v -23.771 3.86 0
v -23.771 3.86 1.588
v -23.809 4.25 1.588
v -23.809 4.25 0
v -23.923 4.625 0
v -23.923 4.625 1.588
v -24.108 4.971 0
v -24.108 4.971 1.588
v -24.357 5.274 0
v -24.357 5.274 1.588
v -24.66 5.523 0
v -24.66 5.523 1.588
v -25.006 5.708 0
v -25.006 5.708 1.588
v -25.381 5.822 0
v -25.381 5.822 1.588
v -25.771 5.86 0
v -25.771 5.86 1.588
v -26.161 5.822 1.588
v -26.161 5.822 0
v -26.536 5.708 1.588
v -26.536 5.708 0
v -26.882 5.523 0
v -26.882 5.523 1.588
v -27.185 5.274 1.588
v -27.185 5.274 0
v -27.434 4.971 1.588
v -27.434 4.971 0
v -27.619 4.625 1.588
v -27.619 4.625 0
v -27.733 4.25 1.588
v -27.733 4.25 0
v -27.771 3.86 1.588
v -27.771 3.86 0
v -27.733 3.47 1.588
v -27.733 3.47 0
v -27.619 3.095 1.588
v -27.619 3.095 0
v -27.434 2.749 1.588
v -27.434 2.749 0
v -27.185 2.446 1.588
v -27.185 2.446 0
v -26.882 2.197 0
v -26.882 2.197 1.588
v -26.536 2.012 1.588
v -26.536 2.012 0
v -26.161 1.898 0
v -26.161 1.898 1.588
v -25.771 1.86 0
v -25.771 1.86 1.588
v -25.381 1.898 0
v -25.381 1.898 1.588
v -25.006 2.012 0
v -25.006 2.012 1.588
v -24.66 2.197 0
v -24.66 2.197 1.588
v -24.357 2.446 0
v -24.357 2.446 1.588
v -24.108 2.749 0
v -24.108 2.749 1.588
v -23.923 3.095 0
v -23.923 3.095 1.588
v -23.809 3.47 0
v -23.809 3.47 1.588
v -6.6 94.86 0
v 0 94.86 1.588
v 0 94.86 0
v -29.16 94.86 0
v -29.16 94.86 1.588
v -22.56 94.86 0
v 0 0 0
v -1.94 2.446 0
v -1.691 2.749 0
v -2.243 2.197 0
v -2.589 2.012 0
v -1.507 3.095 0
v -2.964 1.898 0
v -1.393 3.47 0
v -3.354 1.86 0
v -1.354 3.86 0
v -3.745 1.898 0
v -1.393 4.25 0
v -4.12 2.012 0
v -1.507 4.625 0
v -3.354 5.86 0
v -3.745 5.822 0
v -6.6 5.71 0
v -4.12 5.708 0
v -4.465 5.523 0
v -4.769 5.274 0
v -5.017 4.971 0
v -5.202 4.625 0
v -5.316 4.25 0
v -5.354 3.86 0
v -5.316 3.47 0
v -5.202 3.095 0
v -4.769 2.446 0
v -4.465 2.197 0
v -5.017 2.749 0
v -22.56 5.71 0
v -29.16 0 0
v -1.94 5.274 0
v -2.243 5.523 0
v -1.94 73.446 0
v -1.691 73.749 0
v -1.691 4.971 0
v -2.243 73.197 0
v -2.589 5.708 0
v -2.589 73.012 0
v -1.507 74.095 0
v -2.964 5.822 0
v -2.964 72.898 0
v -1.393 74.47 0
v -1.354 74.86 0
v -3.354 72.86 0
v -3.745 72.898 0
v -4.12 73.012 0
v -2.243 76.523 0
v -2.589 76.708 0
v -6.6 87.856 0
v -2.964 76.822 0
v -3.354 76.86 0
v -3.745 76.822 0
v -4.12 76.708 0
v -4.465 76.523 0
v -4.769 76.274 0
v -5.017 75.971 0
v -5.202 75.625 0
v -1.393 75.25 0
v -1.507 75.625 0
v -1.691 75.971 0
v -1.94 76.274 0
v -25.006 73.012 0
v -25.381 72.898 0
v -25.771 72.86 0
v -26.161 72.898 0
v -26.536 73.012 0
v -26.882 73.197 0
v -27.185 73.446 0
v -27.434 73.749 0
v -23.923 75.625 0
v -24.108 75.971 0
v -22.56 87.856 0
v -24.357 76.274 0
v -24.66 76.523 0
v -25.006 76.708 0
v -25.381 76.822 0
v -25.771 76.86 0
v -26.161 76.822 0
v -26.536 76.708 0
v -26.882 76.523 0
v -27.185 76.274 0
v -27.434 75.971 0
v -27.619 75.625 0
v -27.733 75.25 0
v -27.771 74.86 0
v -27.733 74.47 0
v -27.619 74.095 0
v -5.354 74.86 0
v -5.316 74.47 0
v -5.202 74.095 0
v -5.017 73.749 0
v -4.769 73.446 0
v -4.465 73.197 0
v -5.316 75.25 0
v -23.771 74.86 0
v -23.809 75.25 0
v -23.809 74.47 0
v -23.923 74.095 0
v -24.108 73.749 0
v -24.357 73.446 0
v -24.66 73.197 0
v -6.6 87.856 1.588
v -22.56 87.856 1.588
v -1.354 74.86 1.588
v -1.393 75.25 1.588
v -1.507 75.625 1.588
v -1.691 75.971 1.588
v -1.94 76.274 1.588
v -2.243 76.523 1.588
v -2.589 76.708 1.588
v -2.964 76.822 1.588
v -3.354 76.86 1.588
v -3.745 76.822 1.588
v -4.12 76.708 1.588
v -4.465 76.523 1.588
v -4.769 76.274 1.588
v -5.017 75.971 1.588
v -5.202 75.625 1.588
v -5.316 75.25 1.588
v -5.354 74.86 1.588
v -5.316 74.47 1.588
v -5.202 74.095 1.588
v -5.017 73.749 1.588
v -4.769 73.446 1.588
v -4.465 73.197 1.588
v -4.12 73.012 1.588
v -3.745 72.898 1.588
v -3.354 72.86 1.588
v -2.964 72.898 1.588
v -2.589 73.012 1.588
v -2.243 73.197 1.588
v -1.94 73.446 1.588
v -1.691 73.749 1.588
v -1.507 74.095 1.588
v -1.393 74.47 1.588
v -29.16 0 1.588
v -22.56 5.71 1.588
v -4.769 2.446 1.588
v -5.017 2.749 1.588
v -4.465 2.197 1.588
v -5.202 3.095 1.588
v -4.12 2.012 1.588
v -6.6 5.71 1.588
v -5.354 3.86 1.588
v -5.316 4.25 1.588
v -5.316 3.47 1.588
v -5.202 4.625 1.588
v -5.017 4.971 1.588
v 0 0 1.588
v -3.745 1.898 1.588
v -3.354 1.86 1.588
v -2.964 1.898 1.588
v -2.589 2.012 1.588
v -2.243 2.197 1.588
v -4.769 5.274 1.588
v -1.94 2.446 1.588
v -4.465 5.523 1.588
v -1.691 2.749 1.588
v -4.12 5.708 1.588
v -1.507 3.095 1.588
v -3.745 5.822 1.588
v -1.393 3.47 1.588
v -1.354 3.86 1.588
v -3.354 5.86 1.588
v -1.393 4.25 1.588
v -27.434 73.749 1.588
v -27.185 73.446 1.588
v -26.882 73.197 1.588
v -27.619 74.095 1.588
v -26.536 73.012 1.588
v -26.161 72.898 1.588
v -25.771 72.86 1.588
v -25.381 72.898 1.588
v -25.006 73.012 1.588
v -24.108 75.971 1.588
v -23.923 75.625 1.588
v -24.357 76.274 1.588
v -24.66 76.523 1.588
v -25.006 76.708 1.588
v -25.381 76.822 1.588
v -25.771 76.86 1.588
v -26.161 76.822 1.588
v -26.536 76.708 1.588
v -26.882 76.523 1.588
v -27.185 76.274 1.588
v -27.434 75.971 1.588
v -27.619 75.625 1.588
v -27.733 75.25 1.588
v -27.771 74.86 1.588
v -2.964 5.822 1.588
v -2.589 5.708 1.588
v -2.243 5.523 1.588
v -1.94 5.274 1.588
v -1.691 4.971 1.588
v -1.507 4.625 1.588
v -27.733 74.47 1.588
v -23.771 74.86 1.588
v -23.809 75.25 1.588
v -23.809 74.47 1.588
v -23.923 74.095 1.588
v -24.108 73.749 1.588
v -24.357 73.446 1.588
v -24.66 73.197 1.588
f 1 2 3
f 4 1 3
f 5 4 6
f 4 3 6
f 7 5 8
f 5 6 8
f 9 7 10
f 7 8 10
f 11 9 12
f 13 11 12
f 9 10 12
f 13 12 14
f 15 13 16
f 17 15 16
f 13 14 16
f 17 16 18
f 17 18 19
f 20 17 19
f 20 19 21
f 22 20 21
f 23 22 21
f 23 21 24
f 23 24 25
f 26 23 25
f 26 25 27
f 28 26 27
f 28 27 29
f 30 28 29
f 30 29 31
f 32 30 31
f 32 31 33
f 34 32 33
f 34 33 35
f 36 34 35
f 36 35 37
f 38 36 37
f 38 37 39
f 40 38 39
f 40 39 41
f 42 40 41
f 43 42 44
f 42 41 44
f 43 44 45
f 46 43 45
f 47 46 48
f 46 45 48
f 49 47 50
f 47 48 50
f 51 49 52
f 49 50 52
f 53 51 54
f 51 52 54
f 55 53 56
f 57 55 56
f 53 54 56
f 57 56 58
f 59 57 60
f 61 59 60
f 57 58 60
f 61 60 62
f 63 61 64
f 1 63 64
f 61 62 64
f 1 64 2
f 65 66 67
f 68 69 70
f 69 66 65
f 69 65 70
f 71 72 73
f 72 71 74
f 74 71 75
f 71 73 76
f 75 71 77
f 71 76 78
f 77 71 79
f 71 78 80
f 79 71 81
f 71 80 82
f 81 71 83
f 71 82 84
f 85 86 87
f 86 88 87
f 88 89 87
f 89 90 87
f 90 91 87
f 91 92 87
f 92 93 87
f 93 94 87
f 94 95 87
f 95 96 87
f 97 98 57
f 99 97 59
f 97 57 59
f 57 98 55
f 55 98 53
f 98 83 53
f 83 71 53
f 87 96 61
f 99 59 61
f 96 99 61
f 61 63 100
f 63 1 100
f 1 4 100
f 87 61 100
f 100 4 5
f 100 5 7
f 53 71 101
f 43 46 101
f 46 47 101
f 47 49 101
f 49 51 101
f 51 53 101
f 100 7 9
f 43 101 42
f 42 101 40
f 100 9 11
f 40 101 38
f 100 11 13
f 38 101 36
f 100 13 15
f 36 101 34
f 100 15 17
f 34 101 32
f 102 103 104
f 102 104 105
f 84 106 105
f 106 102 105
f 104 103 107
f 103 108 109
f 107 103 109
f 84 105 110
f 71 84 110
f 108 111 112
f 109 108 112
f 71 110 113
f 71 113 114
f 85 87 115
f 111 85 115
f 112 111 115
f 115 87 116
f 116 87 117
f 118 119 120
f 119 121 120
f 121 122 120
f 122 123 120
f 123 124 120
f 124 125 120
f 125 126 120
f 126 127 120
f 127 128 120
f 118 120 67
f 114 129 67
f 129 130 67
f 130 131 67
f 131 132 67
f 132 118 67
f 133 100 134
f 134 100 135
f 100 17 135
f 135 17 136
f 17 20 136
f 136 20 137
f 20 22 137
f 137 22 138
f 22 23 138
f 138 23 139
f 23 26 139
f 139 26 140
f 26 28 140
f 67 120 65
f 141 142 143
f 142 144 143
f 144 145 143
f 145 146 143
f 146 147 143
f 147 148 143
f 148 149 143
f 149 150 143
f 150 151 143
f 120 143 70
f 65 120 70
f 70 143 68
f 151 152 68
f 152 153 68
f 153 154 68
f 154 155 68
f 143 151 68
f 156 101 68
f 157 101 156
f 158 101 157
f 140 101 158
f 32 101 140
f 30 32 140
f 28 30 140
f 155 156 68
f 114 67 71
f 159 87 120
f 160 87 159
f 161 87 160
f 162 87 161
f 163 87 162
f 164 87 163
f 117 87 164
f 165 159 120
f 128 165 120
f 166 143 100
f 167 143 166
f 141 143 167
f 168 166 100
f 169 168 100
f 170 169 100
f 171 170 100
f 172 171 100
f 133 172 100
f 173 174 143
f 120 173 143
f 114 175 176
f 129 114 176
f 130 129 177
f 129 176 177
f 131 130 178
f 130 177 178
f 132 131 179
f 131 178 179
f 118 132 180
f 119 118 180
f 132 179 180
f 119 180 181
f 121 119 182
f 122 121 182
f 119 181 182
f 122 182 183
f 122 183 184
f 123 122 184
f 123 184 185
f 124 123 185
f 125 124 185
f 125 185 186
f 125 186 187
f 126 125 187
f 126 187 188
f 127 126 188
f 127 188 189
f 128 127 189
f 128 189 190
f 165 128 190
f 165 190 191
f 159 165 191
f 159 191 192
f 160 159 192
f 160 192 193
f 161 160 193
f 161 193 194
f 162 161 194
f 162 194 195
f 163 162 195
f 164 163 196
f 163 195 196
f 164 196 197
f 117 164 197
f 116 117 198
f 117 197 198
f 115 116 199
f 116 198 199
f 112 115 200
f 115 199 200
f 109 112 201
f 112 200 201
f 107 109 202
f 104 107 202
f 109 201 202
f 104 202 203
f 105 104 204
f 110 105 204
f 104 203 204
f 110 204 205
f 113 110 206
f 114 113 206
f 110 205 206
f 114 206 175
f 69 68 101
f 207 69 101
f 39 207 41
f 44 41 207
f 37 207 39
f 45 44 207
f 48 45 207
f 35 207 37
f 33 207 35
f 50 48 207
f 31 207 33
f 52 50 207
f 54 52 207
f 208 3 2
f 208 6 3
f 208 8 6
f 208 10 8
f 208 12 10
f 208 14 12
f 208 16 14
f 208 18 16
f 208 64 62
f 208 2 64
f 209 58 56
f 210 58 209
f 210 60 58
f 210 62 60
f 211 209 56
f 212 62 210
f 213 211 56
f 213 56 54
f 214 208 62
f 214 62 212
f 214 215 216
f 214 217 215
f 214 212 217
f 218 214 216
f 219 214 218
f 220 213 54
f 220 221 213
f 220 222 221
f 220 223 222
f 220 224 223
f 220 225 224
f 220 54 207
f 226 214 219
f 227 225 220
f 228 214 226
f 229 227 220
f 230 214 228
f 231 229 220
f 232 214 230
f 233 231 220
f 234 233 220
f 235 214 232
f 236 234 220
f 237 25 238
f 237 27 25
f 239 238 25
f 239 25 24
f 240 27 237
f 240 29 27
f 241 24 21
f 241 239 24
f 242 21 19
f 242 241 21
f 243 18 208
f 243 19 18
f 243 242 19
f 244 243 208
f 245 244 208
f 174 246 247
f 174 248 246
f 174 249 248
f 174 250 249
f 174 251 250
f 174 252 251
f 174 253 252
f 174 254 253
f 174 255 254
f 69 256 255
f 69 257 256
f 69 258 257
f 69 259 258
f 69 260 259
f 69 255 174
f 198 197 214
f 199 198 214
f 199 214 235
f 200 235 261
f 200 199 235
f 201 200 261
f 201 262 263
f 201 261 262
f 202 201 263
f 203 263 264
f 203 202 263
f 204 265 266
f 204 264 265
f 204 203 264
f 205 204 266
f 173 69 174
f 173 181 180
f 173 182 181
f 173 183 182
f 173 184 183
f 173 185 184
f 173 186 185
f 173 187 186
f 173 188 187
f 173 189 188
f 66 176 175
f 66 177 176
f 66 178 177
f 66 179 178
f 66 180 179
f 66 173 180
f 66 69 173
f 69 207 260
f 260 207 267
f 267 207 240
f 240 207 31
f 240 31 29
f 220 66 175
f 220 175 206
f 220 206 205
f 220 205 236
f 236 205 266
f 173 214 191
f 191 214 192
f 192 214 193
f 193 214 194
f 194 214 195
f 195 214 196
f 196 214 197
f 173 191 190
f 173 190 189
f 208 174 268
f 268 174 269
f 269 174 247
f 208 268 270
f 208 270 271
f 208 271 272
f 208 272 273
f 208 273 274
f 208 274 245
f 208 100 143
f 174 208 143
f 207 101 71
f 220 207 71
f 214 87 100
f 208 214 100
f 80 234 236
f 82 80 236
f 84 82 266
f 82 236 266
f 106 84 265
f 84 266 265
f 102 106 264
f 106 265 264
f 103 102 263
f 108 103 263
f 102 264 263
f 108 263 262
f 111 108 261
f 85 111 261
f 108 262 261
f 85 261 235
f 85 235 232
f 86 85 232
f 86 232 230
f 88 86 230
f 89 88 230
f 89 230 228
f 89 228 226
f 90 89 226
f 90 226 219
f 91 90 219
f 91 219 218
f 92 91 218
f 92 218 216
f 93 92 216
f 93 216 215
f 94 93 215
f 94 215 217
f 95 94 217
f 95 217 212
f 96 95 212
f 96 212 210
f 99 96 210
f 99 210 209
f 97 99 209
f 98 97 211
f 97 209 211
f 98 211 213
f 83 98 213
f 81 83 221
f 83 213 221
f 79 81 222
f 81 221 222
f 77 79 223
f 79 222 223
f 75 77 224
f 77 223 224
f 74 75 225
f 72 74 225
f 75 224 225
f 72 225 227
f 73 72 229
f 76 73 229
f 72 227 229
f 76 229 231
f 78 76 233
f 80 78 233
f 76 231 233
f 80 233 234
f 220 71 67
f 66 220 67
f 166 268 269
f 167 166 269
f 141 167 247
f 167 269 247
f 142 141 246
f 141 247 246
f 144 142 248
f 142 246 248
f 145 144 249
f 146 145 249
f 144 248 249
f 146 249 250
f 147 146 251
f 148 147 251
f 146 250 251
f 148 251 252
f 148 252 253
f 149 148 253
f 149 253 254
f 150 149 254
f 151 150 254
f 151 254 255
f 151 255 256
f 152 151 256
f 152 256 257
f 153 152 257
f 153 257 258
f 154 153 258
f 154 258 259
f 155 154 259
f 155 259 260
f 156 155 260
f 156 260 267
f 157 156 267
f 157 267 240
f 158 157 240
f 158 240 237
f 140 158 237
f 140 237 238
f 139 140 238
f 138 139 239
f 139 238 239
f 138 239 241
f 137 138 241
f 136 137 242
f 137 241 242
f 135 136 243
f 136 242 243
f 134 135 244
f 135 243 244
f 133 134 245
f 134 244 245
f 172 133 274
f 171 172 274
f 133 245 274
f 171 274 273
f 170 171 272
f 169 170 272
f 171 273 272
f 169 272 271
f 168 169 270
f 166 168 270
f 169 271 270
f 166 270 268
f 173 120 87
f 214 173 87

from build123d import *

# Parameters (mm, degrees)
BOSS_EXTRUDE1_DEPTH = 1.5875
BOSS_EXTRUDE2_REACH = 24.56
SKETCH3_W           = 1.5875
SKETCH3_H           = 7.003924561
SKETCH4_R           = 2
CUT_EXTRUDE1_DEPTH  = 15
SKETCH5_R           = 2
BOSS_EXTRUDE3_DEPTH = 1.5875


with BuildPart() as part:
    # Sketch2 → Boss-Extrude1 (new body)
    with BuildSketch(Plane.XY):
        Polygon((0, 0), (0, 94.86), (-6.6, 94.86), (-6.6, 5.71), (-22.56, 5.71), (-22.56, 94.86), (-29.16, 94.86), (-29.16, 0), align=None)
    extrude(amount=BOSS_EXTRUDE1_DEPTH)

    # Sketch3 → Boss-Extrude2 (add, up to next)
    with BuildSketch(Plane(origin=(-22.56, 0, 0), x_dir=(0, 0, -1), z_dir=(1, 0, 0)), mode=Mode.PRIVATE) as boss_extrude2_sk1:
        with Locations((-0.79375, 91.35803772)):
            Rectangle(SKETCH3_W, SKETCH3_H)
    boss_extrude2_tool1 = extrude(boss_extrude2_sk1.sketch, amount=BOSS_EXTRUDE2_REACH, mode=Mode.PRIVATE) - part.part
    add(boss_extrude2_tool1.solids().sort_by_distance((-22.56, 91.358038, 0.79375))[0])

    # Sketch4 → Cut-Extrude1 (cut)
    with BuildSketch(Plane.XY.offset(1.5875)):
        with Locations((-3.354353393, 47.428062363)):
            Circle(SKETCH4_R)
        with Locations((-25.771024386, 47.428062363)):
            Circle(SKETCH4_R)
        with Locations((-25.771024386, 3.86)):
            Circle(SKETCH4_R)
        with Locations((-3.354353393, 3.86)):
            Circle(SKETCH4_R)
        with Locations((-25.771024386, 74.86)):
            Circle(SKETCH4_R)
        with Locations((-3.354353393, 74.86)):
            Circle(SKETCH4_R)
    extrude(amount=-CUT_EXTRUDE1_DEPTH, mode=Mode.SUBTRACT)

    # Sketch5 → Boss-Extrude3 (add)
    with BuildSketch(Plane.XY.offset(1.5875)):
        with Locations((-25.771024386, 47.428062363)):
            Circle(SKETCH5_R)
        with Locations((-3.354353393, 47.428062363)):
            Circle(SKETCH5_R)
    extrude(amount=-BOSS_EXTRUDE3_DEPTH)


solid = part.part
